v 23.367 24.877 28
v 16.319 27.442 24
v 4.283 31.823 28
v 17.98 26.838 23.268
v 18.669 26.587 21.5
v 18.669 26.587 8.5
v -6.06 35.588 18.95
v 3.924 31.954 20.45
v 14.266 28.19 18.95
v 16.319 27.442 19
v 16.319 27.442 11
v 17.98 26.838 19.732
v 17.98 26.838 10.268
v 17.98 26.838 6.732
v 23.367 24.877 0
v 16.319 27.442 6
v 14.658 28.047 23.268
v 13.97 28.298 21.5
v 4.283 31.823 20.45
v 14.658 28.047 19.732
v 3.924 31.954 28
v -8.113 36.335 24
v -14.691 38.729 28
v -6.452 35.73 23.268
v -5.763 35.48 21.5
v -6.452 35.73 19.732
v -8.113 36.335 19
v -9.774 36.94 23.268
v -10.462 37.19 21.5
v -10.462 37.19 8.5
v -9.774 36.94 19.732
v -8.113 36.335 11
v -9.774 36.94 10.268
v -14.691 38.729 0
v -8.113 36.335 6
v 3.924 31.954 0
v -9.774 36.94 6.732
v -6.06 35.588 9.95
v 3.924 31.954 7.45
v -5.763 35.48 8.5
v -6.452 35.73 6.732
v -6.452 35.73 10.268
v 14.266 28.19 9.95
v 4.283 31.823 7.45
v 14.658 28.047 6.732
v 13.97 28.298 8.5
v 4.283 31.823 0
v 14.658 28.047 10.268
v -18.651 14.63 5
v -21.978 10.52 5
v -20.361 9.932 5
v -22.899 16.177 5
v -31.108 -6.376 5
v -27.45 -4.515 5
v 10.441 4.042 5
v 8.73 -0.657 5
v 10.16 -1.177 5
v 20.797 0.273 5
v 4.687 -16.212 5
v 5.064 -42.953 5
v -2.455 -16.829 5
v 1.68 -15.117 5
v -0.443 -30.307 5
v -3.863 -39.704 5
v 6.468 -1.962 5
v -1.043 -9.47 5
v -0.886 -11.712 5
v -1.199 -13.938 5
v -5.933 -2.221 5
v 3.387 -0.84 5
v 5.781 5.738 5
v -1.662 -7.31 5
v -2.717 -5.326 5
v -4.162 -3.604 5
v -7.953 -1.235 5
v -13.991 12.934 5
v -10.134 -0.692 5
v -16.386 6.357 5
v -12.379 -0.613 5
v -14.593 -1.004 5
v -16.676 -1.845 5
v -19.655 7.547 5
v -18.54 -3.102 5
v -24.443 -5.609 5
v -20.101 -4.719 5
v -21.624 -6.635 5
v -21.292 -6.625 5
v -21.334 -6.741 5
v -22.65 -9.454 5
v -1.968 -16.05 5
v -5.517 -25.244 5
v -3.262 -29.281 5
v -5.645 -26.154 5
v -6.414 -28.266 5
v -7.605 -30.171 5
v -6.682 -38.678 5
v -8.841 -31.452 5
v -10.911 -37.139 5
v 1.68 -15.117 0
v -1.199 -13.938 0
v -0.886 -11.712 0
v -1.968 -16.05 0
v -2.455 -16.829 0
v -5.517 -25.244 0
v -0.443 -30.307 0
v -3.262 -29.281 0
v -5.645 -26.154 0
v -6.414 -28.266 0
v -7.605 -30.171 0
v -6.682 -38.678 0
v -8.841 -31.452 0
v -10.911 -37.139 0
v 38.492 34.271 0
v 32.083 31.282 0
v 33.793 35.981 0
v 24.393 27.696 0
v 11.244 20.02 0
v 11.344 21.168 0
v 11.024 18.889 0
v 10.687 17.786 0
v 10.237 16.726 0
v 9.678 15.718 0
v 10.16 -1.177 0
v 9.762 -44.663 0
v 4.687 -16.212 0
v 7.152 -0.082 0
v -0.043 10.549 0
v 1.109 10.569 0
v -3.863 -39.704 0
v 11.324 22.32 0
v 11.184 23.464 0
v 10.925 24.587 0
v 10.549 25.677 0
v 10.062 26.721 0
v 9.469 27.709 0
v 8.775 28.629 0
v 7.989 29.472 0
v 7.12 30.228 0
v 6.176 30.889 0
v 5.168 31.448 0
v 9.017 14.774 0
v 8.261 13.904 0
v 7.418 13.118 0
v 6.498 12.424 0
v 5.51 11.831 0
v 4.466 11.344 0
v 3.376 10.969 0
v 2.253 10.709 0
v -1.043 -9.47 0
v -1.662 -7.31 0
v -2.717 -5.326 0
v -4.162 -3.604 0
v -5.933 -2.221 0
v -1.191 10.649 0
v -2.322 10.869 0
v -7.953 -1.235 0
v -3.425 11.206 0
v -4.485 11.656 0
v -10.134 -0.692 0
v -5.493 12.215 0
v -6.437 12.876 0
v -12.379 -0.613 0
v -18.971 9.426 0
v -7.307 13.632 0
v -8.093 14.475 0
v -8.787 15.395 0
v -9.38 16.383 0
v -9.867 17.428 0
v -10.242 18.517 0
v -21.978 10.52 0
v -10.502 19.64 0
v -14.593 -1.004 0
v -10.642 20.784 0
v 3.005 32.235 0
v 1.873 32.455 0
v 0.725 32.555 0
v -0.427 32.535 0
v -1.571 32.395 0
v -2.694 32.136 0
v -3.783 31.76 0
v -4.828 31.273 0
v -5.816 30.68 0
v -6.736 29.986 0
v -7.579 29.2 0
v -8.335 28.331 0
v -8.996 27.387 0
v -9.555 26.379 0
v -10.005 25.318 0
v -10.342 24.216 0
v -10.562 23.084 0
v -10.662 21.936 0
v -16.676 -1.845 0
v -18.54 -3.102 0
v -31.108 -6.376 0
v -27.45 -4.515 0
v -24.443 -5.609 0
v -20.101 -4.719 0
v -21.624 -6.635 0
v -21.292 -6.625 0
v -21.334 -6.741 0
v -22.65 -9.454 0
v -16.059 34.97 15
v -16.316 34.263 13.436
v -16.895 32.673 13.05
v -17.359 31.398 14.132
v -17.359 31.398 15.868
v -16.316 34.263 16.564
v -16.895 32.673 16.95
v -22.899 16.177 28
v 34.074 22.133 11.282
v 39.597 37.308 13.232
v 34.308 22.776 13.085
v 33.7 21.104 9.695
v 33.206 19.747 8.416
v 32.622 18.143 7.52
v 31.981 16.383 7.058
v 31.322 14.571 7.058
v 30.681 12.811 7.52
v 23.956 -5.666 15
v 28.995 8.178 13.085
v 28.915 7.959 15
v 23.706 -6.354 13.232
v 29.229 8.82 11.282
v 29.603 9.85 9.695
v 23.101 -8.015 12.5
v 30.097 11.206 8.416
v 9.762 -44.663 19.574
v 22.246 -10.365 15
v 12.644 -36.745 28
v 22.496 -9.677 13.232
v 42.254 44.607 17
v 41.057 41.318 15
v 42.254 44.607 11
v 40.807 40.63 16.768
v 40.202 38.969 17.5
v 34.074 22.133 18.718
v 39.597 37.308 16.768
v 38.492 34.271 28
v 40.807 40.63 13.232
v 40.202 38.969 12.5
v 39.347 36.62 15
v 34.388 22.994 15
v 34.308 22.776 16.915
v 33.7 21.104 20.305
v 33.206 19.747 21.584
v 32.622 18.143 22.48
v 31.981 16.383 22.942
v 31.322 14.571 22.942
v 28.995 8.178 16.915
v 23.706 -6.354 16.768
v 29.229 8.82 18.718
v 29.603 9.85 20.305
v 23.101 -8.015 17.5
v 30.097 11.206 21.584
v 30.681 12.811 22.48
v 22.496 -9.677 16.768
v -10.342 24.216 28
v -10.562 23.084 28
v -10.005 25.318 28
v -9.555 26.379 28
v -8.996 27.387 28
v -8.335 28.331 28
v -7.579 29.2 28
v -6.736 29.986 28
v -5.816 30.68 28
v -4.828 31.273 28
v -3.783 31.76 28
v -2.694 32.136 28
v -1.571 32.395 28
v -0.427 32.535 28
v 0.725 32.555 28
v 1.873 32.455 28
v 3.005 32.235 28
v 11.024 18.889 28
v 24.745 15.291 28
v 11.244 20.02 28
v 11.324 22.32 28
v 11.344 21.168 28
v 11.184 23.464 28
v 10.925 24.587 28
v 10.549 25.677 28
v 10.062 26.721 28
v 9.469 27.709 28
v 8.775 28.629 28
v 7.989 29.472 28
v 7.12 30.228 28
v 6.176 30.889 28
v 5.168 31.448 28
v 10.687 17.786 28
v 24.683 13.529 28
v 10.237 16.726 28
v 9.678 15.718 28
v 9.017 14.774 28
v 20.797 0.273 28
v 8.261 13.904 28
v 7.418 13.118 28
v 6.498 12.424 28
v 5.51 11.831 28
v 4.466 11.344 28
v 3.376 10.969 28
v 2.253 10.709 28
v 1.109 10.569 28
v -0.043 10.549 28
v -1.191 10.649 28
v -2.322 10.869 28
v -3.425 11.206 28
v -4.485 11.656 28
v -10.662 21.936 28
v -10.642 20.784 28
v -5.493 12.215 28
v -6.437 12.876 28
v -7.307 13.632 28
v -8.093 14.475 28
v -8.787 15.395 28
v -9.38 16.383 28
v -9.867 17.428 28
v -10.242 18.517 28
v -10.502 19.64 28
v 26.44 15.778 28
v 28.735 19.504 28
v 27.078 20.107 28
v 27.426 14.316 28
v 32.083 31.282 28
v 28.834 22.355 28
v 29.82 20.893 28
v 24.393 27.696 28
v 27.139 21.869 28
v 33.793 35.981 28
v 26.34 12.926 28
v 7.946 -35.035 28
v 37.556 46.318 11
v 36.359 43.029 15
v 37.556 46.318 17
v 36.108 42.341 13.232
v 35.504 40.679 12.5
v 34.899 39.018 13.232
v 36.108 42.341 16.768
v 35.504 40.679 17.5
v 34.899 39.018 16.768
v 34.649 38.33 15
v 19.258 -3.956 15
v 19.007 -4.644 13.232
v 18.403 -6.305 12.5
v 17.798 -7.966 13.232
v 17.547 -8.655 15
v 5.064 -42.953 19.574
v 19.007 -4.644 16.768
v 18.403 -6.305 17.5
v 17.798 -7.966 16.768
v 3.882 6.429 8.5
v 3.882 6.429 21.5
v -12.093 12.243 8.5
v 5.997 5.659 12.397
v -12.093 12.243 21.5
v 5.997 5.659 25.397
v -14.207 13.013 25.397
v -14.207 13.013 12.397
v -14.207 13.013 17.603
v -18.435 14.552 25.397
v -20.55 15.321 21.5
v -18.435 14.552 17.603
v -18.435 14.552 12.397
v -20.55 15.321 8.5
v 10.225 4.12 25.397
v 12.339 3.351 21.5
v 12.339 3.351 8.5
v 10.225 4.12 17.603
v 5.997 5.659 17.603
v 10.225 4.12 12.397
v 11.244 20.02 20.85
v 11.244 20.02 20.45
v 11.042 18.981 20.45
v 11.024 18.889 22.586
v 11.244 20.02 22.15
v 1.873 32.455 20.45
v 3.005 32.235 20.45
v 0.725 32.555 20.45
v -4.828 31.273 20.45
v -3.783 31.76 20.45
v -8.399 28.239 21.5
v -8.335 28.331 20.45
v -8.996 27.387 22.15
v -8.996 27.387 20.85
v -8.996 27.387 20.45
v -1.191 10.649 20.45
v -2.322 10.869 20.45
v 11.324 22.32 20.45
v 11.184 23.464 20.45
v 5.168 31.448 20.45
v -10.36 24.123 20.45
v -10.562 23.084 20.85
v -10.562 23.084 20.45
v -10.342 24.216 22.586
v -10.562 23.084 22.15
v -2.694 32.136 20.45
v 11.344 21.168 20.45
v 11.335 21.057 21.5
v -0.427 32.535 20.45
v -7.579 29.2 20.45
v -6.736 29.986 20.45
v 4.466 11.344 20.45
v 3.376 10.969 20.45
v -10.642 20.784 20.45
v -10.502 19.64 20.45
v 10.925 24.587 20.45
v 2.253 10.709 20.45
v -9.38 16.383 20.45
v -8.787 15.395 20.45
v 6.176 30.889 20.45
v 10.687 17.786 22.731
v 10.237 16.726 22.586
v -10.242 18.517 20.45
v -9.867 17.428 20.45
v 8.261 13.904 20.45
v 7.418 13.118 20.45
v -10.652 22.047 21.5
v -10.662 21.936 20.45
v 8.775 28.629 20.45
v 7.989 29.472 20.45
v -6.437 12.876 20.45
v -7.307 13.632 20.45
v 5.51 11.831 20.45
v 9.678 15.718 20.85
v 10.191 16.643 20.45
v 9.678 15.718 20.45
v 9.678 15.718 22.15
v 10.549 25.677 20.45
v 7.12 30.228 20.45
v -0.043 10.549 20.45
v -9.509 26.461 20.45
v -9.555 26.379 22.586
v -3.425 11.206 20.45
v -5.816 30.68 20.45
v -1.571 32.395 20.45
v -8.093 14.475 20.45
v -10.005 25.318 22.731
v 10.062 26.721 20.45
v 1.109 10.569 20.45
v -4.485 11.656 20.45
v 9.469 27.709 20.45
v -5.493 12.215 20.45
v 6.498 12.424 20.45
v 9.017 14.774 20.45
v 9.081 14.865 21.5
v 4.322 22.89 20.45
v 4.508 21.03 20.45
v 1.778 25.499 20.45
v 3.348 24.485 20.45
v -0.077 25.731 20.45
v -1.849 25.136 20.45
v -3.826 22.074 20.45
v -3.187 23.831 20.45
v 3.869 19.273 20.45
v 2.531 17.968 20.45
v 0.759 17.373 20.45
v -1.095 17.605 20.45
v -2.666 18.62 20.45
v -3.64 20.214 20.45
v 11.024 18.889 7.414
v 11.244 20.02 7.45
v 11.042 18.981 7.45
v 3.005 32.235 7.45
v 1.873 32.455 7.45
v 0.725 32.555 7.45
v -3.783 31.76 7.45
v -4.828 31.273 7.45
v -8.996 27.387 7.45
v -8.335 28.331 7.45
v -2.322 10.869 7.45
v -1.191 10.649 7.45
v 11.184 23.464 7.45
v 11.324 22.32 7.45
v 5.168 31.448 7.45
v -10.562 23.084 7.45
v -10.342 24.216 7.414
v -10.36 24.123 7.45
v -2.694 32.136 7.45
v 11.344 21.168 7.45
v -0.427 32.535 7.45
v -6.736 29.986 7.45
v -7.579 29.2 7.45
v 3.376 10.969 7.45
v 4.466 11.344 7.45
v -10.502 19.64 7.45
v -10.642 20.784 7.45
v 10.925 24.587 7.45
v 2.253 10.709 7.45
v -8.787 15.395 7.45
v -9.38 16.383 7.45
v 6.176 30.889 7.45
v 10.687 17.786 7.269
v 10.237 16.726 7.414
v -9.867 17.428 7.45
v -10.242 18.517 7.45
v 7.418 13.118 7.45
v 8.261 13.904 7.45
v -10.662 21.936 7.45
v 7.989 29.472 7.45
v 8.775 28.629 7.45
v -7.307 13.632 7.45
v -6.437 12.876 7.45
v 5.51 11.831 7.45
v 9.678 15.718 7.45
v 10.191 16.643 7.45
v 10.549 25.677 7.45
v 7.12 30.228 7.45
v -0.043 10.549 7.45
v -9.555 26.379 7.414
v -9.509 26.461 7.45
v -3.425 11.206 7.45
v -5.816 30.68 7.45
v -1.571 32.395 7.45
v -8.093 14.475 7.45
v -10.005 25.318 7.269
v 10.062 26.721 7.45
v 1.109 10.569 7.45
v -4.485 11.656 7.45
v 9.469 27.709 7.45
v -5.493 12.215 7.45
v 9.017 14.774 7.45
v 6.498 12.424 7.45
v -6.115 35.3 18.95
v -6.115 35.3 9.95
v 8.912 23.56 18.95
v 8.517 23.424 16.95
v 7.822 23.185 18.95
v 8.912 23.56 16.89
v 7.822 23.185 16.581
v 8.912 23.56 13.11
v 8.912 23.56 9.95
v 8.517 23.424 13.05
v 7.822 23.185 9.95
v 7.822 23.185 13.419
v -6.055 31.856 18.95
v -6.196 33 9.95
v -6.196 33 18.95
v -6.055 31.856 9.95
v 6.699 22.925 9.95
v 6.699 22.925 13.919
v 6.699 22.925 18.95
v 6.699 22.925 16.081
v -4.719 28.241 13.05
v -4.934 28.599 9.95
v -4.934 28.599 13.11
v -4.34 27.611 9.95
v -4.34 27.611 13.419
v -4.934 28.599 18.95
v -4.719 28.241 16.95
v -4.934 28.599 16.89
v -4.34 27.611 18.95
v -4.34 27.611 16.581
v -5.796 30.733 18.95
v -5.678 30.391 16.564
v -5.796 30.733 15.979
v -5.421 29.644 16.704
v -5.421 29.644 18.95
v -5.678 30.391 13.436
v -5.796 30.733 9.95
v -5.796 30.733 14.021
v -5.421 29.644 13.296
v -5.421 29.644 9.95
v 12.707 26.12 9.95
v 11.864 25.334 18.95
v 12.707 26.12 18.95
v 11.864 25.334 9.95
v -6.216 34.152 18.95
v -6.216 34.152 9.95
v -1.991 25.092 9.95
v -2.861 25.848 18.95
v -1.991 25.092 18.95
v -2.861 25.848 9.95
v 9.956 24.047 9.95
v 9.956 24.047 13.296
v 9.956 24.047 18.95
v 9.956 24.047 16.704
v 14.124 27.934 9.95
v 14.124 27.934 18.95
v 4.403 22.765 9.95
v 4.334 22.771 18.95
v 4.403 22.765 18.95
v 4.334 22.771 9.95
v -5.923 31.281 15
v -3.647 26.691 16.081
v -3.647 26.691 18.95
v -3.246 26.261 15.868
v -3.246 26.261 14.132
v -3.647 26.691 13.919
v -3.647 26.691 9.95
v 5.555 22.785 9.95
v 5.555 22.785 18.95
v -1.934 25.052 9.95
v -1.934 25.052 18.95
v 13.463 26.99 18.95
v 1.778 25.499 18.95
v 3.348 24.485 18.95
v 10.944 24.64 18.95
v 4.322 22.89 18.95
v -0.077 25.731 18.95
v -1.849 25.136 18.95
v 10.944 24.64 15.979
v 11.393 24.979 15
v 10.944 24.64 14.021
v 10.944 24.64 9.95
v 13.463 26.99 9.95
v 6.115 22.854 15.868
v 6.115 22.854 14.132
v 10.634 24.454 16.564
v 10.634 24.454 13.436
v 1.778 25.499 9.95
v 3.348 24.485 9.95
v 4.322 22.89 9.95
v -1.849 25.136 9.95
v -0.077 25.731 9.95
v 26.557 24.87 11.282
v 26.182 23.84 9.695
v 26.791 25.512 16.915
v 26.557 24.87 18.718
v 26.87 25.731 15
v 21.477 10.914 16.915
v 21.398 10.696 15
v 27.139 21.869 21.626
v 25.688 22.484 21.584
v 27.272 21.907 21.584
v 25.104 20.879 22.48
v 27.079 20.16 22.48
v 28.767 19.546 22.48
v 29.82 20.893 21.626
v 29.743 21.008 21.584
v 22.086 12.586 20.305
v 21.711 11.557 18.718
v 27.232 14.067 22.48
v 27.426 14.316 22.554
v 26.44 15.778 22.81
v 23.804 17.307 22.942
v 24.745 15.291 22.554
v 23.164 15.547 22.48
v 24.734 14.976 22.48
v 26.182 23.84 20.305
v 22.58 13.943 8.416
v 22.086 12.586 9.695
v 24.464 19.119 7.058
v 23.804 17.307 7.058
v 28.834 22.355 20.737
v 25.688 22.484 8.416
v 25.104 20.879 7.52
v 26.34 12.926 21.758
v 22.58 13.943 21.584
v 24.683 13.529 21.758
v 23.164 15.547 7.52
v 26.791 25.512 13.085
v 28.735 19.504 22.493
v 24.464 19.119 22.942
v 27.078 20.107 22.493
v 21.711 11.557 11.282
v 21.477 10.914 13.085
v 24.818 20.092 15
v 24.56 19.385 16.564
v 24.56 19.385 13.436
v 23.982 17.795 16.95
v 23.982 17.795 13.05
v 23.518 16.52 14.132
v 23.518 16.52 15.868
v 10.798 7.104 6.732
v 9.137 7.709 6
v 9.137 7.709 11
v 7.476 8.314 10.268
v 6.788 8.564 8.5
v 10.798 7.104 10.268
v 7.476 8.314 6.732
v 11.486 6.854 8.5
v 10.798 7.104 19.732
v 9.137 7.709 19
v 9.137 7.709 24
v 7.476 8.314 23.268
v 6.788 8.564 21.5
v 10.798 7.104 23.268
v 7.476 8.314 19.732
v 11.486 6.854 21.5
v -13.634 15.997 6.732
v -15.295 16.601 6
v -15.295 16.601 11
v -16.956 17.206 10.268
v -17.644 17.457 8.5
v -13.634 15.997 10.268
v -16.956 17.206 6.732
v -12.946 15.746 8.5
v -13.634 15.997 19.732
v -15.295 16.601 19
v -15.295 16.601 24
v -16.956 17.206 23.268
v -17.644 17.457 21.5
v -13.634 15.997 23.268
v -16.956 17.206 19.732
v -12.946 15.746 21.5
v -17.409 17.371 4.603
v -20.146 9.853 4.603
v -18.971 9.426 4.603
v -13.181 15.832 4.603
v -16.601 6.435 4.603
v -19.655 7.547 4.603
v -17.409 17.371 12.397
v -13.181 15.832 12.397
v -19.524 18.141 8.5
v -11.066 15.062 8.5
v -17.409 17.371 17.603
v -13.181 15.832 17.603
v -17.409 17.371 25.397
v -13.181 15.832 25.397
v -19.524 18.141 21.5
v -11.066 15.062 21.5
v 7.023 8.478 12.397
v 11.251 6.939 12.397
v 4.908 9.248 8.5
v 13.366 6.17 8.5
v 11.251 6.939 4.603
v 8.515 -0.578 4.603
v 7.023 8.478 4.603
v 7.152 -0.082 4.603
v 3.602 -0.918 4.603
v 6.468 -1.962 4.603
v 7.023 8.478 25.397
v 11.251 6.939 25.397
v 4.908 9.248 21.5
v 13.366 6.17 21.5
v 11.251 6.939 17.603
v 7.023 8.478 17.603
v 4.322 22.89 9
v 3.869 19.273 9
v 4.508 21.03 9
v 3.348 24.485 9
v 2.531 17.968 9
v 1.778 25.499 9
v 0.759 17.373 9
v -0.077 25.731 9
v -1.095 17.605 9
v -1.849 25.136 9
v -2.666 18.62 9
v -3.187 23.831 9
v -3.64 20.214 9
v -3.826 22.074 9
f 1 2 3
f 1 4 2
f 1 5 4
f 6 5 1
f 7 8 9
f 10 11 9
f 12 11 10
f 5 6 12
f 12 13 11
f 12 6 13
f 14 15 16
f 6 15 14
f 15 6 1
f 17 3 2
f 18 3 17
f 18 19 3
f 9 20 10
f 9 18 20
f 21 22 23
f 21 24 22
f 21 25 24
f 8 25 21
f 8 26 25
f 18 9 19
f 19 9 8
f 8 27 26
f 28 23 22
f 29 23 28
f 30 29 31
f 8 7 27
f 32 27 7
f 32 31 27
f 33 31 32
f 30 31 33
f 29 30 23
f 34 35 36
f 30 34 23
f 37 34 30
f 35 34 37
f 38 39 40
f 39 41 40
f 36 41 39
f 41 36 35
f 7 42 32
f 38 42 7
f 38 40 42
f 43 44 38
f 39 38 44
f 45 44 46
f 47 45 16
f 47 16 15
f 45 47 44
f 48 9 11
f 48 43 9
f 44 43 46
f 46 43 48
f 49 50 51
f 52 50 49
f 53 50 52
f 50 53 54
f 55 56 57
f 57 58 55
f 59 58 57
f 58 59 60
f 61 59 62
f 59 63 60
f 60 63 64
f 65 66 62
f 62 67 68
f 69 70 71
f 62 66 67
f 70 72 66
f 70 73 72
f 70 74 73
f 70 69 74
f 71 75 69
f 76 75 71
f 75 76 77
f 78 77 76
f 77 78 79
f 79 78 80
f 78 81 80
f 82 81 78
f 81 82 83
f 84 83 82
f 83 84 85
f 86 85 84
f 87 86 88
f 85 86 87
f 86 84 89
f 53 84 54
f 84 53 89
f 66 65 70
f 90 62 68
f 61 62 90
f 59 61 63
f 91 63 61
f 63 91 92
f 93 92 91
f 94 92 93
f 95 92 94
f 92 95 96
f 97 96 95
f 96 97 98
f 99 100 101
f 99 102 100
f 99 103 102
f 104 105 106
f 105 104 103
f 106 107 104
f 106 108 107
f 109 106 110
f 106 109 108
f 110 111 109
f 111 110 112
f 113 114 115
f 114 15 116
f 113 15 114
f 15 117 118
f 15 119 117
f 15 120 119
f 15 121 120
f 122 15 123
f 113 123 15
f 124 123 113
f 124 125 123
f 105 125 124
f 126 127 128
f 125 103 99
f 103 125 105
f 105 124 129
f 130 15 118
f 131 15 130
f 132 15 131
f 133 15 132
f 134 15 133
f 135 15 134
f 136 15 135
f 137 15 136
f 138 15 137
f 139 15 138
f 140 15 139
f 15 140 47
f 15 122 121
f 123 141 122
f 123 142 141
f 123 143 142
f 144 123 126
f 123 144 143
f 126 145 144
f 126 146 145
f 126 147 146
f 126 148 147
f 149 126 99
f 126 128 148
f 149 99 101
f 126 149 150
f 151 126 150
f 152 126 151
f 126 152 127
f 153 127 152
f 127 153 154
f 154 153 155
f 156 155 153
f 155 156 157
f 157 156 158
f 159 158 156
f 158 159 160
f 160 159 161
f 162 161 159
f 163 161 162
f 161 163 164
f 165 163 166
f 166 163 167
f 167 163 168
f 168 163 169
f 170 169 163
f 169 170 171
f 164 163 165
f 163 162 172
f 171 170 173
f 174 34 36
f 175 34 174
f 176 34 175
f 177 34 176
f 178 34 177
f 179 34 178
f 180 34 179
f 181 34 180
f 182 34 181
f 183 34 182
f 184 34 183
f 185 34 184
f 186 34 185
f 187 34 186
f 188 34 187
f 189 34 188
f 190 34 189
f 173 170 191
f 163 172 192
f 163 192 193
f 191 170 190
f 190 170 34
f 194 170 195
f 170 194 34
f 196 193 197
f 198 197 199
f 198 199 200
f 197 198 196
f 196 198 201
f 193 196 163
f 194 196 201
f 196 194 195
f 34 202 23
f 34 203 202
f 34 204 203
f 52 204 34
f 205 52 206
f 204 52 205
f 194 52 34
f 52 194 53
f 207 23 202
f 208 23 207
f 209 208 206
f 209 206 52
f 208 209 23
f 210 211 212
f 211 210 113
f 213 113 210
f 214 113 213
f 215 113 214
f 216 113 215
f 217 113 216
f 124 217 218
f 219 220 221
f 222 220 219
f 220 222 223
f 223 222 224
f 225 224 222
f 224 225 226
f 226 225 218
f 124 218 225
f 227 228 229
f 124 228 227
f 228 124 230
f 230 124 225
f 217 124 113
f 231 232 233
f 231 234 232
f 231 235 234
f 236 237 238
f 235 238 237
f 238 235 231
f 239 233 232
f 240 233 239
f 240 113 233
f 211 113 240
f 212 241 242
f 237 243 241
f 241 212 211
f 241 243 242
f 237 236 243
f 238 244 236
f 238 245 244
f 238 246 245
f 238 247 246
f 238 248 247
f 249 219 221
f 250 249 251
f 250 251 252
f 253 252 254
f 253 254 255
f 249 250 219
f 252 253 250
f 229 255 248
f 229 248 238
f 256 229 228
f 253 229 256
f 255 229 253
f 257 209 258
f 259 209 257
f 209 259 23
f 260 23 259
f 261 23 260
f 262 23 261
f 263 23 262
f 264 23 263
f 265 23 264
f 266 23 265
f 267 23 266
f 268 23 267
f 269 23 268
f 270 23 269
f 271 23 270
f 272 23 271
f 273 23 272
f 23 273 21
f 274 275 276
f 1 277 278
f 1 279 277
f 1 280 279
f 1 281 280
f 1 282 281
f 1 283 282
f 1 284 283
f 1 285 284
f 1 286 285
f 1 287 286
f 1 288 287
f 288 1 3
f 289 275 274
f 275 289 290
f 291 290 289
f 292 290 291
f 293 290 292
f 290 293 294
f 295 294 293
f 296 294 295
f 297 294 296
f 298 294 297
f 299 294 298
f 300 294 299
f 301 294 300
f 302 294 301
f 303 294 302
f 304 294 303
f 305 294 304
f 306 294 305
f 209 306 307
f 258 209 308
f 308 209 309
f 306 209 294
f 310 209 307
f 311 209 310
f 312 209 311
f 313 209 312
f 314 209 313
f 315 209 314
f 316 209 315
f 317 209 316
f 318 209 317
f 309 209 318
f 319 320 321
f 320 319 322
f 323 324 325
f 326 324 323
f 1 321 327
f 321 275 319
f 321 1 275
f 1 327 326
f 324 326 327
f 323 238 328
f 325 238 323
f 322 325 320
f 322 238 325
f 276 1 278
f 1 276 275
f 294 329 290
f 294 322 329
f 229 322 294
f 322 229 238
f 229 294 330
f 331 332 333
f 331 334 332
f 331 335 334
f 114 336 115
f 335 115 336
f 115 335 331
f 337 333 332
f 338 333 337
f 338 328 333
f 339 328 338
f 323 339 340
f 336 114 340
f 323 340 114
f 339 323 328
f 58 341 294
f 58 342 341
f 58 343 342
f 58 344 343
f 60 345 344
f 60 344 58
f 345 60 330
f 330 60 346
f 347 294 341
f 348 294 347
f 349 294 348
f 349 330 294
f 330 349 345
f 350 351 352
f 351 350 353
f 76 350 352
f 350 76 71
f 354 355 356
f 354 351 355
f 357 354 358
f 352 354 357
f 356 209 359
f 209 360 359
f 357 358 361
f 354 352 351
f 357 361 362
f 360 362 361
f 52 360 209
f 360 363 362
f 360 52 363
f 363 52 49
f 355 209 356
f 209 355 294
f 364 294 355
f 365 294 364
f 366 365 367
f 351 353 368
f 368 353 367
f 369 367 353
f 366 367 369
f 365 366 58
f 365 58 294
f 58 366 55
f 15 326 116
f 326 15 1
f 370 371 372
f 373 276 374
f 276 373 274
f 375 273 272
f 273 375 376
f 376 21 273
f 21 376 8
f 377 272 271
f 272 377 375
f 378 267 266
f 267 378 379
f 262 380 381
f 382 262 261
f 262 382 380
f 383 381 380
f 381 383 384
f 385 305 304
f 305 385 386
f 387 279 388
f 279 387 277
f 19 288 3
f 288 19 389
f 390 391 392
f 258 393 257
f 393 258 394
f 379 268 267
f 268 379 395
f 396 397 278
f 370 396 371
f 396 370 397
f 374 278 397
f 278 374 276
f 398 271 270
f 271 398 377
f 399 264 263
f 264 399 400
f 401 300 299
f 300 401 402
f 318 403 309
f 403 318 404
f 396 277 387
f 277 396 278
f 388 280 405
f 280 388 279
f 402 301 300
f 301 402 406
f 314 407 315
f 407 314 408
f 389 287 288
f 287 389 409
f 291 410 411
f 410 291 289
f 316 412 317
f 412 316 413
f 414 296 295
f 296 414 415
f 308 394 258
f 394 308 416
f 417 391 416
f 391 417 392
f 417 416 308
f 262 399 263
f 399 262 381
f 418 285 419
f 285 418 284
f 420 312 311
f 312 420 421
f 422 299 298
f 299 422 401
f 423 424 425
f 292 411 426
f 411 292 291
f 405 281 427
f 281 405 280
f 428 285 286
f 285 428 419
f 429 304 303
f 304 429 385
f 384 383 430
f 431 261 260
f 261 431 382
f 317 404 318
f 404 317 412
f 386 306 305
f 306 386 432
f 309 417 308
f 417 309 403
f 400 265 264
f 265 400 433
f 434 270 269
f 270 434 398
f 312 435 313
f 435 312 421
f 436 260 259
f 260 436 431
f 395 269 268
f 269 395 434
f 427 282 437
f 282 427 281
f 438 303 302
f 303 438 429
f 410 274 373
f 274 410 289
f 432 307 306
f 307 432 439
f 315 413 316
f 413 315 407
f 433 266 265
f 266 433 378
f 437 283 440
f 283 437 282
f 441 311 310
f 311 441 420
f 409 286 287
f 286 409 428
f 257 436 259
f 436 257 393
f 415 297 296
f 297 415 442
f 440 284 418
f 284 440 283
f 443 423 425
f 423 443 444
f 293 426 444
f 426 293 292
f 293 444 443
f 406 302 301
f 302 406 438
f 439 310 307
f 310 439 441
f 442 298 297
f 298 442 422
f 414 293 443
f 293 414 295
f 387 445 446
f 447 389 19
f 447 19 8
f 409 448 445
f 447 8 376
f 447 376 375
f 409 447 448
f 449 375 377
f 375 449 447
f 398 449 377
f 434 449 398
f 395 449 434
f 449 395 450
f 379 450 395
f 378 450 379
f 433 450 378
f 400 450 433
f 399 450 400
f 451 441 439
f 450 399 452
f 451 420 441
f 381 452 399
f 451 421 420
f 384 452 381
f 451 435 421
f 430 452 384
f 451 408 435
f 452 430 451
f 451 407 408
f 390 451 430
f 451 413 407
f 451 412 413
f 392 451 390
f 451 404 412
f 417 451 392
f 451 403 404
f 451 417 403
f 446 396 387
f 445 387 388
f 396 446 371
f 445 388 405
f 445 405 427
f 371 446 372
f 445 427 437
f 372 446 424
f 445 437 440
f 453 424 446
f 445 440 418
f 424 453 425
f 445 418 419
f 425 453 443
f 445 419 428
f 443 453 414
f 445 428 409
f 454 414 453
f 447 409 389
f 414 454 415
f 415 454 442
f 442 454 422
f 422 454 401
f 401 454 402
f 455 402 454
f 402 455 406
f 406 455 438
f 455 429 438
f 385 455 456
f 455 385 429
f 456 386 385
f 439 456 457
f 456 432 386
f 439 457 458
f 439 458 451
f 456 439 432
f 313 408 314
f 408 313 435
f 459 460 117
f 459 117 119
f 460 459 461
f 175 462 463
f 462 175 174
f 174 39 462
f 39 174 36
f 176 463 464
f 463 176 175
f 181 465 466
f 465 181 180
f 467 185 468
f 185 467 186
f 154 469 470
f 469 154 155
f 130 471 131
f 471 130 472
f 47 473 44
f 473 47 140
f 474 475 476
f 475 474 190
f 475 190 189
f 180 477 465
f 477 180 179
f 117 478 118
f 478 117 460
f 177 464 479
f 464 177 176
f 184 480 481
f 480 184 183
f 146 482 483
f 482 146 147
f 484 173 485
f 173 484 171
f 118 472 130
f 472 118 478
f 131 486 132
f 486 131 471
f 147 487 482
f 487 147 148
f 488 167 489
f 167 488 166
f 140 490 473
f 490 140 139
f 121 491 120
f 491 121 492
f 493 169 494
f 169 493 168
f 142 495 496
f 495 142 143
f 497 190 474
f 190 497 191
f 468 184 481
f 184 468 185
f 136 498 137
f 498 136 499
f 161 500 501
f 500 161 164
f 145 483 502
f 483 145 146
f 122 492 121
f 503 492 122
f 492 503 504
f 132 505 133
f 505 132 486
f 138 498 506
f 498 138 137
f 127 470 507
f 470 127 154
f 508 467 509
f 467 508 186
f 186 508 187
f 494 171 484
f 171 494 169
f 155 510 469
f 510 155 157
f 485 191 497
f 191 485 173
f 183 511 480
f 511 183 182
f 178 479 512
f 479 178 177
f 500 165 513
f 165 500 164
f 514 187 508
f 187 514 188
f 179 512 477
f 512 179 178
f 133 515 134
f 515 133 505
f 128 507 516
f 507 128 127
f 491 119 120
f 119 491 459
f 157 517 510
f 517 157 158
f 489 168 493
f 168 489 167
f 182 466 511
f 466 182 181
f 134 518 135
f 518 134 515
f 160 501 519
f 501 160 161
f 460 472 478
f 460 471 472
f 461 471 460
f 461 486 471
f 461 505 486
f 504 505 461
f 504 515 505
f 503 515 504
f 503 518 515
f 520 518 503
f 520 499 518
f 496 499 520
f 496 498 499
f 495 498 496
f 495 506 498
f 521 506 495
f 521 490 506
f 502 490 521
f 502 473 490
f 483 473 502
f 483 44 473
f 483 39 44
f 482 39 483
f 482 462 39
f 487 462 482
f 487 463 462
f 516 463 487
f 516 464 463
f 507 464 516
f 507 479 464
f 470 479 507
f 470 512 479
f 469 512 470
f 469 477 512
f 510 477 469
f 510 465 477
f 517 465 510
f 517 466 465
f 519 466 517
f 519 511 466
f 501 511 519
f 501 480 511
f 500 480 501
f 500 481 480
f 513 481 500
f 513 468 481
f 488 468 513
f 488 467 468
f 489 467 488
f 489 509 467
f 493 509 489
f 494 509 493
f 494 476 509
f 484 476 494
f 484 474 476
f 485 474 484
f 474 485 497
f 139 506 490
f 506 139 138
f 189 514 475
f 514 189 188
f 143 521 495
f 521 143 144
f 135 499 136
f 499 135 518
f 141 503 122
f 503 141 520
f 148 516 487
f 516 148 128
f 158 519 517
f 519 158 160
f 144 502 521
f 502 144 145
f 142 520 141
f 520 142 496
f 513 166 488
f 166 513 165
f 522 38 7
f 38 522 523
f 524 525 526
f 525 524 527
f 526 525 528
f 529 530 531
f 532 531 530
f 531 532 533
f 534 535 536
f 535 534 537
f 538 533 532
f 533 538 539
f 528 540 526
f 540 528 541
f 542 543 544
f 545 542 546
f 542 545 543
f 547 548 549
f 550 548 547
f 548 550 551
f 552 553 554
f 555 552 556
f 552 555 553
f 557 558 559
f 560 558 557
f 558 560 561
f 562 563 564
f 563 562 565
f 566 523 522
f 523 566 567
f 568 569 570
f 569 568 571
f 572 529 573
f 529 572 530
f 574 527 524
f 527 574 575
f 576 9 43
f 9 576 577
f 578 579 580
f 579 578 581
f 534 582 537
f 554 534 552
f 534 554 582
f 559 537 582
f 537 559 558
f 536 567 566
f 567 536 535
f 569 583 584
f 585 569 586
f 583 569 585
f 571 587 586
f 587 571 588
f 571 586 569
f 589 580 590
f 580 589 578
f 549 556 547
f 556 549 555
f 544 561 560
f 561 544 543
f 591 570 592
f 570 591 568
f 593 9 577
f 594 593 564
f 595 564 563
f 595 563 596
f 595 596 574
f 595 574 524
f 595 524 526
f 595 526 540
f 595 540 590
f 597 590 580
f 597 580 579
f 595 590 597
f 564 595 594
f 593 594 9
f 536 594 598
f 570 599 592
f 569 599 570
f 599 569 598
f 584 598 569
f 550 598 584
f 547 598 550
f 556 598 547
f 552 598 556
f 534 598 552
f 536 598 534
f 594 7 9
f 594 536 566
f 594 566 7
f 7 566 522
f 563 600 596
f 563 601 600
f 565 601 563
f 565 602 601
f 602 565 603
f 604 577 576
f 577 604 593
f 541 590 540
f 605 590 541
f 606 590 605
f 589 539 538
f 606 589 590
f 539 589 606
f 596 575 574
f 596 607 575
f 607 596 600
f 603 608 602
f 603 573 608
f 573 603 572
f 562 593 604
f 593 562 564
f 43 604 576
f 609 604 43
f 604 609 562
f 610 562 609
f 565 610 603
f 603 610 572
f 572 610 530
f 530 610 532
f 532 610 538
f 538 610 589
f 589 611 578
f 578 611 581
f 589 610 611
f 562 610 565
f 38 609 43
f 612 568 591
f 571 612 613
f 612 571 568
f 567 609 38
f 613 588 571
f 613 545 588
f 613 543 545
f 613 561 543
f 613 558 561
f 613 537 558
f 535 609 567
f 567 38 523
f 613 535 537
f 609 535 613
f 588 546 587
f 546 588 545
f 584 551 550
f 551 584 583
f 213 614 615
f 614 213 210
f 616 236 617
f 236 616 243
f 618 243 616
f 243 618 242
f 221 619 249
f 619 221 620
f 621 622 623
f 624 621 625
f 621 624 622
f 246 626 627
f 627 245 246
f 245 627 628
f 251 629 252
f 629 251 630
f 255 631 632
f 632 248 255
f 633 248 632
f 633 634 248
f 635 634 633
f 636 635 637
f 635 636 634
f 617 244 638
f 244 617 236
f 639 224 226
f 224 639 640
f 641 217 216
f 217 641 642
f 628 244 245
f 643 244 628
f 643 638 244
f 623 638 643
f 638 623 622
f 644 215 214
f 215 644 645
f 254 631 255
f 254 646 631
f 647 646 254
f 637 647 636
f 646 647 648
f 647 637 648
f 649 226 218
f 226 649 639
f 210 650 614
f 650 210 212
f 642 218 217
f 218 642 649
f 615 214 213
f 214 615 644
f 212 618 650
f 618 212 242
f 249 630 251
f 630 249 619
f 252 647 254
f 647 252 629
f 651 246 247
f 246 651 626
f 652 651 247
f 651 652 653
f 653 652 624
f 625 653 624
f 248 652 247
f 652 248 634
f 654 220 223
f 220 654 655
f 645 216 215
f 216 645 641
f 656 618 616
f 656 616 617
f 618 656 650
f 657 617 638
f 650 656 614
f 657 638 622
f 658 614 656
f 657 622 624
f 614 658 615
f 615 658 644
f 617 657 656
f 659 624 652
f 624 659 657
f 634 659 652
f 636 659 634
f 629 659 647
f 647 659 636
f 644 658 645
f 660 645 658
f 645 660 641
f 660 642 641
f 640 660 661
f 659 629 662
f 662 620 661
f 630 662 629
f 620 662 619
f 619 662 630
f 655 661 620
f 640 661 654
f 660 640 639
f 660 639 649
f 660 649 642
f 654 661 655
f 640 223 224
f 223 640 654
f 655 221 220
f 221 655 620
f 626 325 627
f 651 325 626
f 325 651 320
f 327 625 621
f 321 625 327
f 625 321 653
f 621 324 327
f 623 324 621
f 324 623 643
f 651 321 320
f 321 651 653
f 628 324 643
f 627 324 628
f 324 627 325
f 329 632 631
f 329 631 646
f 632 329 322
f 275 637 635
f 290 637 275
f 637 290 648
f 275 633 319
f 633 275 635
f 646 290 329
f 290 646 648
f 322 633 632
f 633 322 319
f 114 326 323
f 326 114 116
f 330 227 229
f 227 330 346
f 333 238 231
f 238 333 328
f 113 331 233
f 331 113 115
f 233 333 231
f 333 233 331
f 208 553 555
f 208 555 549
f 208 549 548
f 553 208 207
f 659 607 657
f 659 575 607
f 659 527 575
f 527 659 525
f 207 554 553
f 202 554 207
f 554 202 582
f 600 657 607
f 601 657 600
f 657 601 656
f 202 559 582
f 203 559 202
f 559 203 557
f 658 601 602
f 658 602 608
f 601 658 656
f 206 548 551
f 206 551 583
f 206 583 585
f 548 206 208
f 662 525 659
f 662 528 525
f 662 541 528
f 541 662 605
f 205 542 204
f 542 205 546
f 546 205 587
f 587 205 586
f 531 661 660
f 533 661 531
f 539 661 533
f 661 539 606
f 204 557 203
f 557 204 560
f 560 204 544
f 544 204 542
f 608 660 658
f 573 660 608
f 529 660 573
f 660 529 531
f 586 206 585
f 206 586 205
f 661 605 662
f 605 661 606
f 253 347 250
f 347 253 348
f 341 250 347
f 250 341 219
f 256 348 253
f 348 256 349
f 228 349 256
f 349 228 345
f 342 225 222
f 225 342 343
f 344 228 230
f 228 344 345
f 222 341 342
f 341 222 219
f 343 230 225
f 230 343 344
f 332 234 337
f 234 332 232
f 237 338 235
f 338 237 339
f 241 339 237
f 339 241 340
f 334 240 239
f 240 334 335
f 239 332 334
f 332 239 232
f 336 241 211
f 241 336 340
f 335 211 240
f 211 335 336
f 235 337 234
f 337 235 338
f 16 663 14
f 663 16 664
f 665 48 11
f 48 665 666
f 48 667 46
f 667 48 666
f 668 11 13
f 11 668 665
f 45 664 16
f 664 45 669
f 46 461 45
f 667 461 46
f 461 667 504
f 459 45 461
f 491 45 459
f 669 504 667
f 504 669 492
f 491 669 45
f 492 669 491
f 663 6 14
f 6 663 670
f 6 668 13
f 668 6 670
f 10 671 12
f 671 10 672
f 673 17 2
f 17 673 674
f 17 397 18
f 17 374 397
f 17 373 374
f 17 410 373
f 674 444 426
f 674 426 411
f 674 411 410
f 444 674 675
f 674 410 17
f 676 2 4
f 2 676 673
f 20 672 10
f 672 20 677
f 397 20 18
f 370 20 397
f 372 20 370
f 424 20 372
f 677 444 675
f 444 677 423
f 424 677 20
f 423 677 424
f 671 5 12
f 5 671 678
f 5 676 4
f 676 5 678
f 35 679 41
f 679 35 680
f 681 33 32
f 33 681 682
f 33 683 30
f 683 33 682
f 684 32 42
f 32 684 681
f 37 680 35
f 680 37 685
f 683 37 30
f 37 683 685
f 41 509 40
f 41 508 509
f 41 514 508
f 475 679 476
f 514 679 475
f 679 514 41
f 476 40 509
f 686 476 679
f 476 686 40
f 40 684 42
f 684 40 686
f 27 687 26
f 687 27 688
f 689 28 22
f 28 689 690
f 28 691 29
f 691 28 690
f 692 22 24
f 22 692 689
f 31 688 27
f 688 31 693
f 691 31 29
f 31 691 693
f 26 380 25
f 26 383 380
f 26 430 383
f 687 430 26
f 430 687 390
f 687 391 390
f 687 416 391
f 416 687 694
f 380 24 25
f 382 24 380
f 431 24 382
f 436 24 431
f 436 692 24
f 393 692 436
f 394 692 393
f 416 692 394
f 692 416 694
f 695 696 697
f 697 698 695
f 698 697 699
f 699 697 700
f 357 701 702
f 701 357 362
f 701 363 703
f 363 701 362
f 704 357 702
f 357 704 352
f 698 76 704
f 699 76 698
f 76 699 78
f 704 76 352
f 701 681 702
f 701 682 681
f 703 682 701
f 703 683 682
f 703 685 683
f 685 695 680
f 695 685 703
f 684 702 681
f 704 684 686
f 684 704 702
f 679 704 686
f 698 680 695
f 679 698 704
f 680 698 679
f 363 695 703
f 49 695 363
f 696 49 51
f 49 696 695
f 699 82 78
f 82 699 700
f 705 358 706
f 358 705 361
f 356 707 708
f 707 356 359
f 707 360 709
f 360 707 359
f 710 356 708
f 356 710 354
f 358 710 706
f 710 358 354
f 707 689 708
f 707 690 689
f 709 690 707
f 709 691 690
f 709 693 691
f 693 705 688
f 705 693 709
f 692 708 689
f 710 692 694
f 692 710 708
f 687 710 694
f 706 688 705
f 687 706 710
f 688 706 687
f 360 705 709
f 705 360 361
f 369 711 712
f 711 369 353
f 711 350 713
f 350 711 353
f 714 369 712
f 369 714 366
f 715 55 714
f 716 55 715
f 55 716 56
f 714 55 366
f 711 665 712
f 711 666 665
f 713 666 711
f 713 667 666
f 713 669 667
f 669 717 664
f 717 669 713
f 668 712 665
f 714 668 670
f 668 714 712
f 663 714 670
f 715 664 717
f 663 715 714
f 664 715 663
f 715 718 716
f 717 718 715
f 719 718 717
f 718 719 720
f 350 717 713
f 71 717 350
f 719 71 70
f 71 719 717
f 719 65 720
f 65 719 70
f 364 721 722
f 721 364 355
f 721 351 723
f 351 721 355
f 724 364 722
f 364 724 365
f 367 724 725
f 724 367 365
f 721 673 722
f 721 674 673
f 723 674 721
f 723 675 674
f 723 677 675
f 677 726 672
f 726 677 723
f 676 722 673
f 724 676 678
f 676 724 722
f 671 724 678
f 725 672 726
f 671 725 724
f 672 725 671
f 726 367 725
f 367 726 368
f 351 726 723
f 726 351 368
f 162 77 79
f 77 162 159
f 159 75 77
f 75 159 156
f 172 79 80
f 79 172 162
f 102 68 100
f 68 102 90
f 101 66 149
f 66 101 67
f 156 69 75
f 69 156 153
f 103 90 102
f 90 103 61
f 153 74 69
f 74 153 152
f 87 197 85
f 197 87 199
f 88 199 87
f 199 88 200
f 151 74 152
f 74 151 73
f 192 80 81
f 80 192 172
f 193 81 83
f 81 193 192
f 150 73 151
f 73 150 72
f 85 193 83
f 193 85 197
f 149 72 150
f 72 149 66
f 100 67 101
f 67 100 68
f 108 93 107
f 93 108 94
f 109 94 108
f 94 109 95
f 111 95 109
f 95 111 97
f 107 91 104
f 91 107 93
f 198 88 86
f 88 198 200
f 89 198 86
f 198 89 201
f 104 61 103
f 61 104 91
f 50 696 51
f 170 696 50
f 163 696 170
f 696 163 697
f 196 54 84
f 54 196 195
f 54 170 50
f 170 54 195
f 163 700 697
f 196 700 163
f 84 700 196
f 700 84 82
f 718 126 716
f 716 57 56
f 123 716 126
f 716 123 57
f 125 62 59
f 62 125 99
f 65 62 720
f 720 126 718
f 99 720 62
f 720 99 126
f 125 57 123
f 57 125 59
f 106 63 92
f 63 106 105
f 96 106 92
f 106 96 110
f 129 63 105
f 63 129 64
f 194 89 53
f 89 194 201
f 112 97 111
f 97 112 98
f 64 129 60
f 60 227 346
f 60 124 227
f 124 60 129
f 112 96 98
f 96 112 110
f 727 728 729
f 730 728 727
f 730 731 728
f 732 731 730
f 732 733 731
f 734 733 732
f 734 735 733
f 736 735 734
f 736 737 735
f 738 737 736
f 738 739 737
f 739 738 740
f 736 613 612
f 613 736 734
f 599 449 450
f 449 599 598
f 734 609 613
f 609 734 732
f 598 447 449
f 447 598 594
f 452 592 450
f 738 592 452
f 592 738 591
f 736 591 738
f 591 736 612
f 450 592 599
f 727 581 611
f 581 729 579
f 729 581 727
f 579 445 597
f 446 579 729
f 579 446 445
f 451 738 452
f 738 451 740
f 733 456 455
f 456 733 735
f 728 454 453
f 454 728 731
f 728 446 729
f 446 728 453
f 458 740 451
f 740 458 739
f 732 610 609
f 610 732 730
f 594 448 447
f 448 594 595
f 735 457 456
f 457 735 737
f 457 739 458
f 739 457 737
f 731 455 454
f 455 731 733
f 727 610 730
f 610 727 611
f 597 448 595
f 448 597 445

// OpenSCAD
// file: configuration.scad
// PRUSA Mendel  
// Configuration file
// GNU GPL v2
// Josef Průša
// josefprusa@me.com
// prusadjs.cz
// http://www.reprap.org/wiki/Prusa_Mendel
// http://github.com/prusajr/PrusaMendel

// PLEASE SELECT ONE OF THE CONFIGURATIONS BELOW
// BY UN-COMMENTING IT

variant=0; //0 for metric
//variant=1; //1 for SAE
if(variant==0){
echo("variant: metric");
}else if(variant==1){
echo("variant: sae");
} else{
echo("WARNING: INVALID CONFIGURATION");
}


vars=[
//[m8_dia, m8_nut, m4_dia, m4_nut, m3_dia, m3_nut, bush_dia, mot_shaft, bush_rod, bush_outerdia, bush_length]
[8.4,16.4,5,9,4.4,7,11,5,8,16,11],//metric
[9,16.4,5.5,10,5.5,10,11.5,5,7.9375,16,11]//SAE
];

//BUSHING TYPE Can generate three versions
// 1 - regular old ones
// 2 - helical ones
// 3 - holders for brass or any other bought bushings
bushing_type = 2;

//DO NOT TOUCH THIS SECTION!
m8_diameter = vars[variant][0];
m8_nut_diameter = vars[variant][1];
m4_diameter = vars[variant][2];
m4_nut_diameter = vars[variant][3];
m3_diameter = vars[variant][4];
m3_nut_diameter = vars[variant][5];
bushing_diameter = vars[variant][6];
motor_shaft=vars[variant][7];
bushing_rodsize = vars[variant][8];
bushing_outerDiameter = vars[variant][9];
bushing_lenght = vars[variant][10];


// MINI-HUXLEY VERSION (TODO, just place holder)
// include <configuration-huxley.scad>

// MEGA VERSION (TODO, just place holder)
// include <configuration-mega.scad>
// main file
include<configuration.scad>
devx=2;

module b608(h=8){
difference(){
union(){
translate([0,0,3.45]) cylinder(r=11.01,h=h,center=true,$fn=60);
translate([0,0,3.5]) cylinder(r=6,h=7,center=true,$fn=30);
}
//translate([0,0,3.5]) cylinder(r=4,h=8,center=true,$fn=30);
}
}
module wadeblock(bfb=false){
difference(){
union(){
cube([81,51.5,5]);
cube([109,5,28]);
translate([57,0,0])cube([24,51.5,28]);
translate([80,1,0])cube([10,10,28]);
}
translate([90,5,0]) rotate([0,0,45])cube([10,10,28]);

translate([-21,0,30]) rotate([0,45,0])cube([30,5,30]);
translate([95,0,28]) rotate([0,45,0])cube([20,5,20]);
translate([95,0,0]) rotate([0,45,0])cube([20,5,20]);
translate([106,0,4]) rotate([0,0,0])cube([20,5,20]);
translate([75,20,15]) rotate([90,0,0]) cylinder(h = 70, r=4/2, center=true);
translate([75-25,2,15]) rotate([90,0,0]) cylinder(h = 10, r=m4_diameter/2, center=true);
translate([75+25,2,15]) rotate([90,0,0]) cylinder(h = 10, r=m4_diameter/2, center=true);
translate([70,18.5,8.5]) rotate([90,0,90])cylinder(h=40,r=(m4_diameter)/2, center=true);
translate([70,18.5,21.5]) rotate([90,0,90])cylinder(h=40,r=(m4_diameter)/2, center=true);
translate([70,44.5,8.5]) rotate([90,0,90])cylinder(h=40,r=(m4_diameter)/2, center=true);
translate([70,44.5,21.5]) rotate([90,0,90])cylinder(h=40,r=(m4_diameter)/2, center=true);
translate([55,44.5,8.5]) rotate([90,0,90])cylinder(h=10,r=(m4_nut_diameter)/2, $fn=6, center=true);
translate([55,44.5,21.5]) rotate([90,0,90])cylinder(h=10,r=(m4_nut_diameter)/2, $fn=6, center=true);
translate([55,18.5,8.5]) rotate([90,0,90])cylinder(h=10,r=(m4_nut_diameter)/2, $fn=6, center=true);
translate([55,18.5,21.5]) rotate([90,0,90])cylinder(h=10,r=(m4_nut_diameter)/2, $fn=6, center=true);
translate([35,31.5,-1]) cylinder(r=10.75,h=10);
translate([22,31.5,-1]) cylinder(r=10.75,h=10);
translate([21,21,-1]) cube([15,21.5,10]);
translate([36,45.5,-1]) cube([16,3.2,10]);
translate([36,14.5,-1]) cube([16,3.2,10]);
translate([5,45.5,-1]) cube([16,3.2,10]);
translate([5+devx,14.5,-1]) cube([16-devx,3,50]);
translate([-5,22]) rotate([0,0,0])cube([38,30,6]);
translate([-5,-1]) rotate([0,0,0])cube([16,30,30]);
translate([70,31.5,9]) cylinder(r=m8_diameter/2,h=30);
translate([70,31.5,21]) b608();
translate([70,31.5,-0]) b608();
translate([83,31.5,11]) b608(9);
if(bfb){
translate([56.5,5,-1]) cube([9,5,12]);
translate([84.5,5,-1]) cube([9,5,12]);
translate([75,0,15]) rotate([0,180,0]){
rotate([0,180,0]) translate([0,2,16.6]) rotate([90,0,0]) cylinder(r=6,h=10, center=true);

rotate([0,180+180,0]) translate([0,0,16.6]) rotate([90,0,0]) cylinder(r=3,h=5, center=true);
rotate([0,180+60,0]) translate([0,0,16.6]) rotate([90,0,0]) cylinder(r=4,h=6, center=true);
rotate([0,180-60,0]) translate([0,0,16.6]) rotate([90,0,0]) cylinder(r=4,h=6, center=true);
rotate([0,60,0]) translate([0,0,16.6]) rotate([90,0,0]) cylinder(r=2.6,h=25, center=true);
rotate([0,-60,0]) translate([0,0,16.6]) rotate([90,0,0]) cylinder(r=2.6,h=25, center=true);
}
}
else{
translate([75,-7,15]) rotate([90,0,0]) cylinder(h = 30, r=16/2, center=true);
translate([79,5,25]) rotate([0,0,0]) cylinder(h = 20, r=3/2, center=true);
translate([72,5,25]) rotate([0,0,0]) cylinder(h = 20, r=3/2, center=true);

}

}}
bfbext=false;
translate([6,-55,0]) rotate([0,0,70]) wadeblock(bfbext);
%cube([85,98,0.01],center=true);
